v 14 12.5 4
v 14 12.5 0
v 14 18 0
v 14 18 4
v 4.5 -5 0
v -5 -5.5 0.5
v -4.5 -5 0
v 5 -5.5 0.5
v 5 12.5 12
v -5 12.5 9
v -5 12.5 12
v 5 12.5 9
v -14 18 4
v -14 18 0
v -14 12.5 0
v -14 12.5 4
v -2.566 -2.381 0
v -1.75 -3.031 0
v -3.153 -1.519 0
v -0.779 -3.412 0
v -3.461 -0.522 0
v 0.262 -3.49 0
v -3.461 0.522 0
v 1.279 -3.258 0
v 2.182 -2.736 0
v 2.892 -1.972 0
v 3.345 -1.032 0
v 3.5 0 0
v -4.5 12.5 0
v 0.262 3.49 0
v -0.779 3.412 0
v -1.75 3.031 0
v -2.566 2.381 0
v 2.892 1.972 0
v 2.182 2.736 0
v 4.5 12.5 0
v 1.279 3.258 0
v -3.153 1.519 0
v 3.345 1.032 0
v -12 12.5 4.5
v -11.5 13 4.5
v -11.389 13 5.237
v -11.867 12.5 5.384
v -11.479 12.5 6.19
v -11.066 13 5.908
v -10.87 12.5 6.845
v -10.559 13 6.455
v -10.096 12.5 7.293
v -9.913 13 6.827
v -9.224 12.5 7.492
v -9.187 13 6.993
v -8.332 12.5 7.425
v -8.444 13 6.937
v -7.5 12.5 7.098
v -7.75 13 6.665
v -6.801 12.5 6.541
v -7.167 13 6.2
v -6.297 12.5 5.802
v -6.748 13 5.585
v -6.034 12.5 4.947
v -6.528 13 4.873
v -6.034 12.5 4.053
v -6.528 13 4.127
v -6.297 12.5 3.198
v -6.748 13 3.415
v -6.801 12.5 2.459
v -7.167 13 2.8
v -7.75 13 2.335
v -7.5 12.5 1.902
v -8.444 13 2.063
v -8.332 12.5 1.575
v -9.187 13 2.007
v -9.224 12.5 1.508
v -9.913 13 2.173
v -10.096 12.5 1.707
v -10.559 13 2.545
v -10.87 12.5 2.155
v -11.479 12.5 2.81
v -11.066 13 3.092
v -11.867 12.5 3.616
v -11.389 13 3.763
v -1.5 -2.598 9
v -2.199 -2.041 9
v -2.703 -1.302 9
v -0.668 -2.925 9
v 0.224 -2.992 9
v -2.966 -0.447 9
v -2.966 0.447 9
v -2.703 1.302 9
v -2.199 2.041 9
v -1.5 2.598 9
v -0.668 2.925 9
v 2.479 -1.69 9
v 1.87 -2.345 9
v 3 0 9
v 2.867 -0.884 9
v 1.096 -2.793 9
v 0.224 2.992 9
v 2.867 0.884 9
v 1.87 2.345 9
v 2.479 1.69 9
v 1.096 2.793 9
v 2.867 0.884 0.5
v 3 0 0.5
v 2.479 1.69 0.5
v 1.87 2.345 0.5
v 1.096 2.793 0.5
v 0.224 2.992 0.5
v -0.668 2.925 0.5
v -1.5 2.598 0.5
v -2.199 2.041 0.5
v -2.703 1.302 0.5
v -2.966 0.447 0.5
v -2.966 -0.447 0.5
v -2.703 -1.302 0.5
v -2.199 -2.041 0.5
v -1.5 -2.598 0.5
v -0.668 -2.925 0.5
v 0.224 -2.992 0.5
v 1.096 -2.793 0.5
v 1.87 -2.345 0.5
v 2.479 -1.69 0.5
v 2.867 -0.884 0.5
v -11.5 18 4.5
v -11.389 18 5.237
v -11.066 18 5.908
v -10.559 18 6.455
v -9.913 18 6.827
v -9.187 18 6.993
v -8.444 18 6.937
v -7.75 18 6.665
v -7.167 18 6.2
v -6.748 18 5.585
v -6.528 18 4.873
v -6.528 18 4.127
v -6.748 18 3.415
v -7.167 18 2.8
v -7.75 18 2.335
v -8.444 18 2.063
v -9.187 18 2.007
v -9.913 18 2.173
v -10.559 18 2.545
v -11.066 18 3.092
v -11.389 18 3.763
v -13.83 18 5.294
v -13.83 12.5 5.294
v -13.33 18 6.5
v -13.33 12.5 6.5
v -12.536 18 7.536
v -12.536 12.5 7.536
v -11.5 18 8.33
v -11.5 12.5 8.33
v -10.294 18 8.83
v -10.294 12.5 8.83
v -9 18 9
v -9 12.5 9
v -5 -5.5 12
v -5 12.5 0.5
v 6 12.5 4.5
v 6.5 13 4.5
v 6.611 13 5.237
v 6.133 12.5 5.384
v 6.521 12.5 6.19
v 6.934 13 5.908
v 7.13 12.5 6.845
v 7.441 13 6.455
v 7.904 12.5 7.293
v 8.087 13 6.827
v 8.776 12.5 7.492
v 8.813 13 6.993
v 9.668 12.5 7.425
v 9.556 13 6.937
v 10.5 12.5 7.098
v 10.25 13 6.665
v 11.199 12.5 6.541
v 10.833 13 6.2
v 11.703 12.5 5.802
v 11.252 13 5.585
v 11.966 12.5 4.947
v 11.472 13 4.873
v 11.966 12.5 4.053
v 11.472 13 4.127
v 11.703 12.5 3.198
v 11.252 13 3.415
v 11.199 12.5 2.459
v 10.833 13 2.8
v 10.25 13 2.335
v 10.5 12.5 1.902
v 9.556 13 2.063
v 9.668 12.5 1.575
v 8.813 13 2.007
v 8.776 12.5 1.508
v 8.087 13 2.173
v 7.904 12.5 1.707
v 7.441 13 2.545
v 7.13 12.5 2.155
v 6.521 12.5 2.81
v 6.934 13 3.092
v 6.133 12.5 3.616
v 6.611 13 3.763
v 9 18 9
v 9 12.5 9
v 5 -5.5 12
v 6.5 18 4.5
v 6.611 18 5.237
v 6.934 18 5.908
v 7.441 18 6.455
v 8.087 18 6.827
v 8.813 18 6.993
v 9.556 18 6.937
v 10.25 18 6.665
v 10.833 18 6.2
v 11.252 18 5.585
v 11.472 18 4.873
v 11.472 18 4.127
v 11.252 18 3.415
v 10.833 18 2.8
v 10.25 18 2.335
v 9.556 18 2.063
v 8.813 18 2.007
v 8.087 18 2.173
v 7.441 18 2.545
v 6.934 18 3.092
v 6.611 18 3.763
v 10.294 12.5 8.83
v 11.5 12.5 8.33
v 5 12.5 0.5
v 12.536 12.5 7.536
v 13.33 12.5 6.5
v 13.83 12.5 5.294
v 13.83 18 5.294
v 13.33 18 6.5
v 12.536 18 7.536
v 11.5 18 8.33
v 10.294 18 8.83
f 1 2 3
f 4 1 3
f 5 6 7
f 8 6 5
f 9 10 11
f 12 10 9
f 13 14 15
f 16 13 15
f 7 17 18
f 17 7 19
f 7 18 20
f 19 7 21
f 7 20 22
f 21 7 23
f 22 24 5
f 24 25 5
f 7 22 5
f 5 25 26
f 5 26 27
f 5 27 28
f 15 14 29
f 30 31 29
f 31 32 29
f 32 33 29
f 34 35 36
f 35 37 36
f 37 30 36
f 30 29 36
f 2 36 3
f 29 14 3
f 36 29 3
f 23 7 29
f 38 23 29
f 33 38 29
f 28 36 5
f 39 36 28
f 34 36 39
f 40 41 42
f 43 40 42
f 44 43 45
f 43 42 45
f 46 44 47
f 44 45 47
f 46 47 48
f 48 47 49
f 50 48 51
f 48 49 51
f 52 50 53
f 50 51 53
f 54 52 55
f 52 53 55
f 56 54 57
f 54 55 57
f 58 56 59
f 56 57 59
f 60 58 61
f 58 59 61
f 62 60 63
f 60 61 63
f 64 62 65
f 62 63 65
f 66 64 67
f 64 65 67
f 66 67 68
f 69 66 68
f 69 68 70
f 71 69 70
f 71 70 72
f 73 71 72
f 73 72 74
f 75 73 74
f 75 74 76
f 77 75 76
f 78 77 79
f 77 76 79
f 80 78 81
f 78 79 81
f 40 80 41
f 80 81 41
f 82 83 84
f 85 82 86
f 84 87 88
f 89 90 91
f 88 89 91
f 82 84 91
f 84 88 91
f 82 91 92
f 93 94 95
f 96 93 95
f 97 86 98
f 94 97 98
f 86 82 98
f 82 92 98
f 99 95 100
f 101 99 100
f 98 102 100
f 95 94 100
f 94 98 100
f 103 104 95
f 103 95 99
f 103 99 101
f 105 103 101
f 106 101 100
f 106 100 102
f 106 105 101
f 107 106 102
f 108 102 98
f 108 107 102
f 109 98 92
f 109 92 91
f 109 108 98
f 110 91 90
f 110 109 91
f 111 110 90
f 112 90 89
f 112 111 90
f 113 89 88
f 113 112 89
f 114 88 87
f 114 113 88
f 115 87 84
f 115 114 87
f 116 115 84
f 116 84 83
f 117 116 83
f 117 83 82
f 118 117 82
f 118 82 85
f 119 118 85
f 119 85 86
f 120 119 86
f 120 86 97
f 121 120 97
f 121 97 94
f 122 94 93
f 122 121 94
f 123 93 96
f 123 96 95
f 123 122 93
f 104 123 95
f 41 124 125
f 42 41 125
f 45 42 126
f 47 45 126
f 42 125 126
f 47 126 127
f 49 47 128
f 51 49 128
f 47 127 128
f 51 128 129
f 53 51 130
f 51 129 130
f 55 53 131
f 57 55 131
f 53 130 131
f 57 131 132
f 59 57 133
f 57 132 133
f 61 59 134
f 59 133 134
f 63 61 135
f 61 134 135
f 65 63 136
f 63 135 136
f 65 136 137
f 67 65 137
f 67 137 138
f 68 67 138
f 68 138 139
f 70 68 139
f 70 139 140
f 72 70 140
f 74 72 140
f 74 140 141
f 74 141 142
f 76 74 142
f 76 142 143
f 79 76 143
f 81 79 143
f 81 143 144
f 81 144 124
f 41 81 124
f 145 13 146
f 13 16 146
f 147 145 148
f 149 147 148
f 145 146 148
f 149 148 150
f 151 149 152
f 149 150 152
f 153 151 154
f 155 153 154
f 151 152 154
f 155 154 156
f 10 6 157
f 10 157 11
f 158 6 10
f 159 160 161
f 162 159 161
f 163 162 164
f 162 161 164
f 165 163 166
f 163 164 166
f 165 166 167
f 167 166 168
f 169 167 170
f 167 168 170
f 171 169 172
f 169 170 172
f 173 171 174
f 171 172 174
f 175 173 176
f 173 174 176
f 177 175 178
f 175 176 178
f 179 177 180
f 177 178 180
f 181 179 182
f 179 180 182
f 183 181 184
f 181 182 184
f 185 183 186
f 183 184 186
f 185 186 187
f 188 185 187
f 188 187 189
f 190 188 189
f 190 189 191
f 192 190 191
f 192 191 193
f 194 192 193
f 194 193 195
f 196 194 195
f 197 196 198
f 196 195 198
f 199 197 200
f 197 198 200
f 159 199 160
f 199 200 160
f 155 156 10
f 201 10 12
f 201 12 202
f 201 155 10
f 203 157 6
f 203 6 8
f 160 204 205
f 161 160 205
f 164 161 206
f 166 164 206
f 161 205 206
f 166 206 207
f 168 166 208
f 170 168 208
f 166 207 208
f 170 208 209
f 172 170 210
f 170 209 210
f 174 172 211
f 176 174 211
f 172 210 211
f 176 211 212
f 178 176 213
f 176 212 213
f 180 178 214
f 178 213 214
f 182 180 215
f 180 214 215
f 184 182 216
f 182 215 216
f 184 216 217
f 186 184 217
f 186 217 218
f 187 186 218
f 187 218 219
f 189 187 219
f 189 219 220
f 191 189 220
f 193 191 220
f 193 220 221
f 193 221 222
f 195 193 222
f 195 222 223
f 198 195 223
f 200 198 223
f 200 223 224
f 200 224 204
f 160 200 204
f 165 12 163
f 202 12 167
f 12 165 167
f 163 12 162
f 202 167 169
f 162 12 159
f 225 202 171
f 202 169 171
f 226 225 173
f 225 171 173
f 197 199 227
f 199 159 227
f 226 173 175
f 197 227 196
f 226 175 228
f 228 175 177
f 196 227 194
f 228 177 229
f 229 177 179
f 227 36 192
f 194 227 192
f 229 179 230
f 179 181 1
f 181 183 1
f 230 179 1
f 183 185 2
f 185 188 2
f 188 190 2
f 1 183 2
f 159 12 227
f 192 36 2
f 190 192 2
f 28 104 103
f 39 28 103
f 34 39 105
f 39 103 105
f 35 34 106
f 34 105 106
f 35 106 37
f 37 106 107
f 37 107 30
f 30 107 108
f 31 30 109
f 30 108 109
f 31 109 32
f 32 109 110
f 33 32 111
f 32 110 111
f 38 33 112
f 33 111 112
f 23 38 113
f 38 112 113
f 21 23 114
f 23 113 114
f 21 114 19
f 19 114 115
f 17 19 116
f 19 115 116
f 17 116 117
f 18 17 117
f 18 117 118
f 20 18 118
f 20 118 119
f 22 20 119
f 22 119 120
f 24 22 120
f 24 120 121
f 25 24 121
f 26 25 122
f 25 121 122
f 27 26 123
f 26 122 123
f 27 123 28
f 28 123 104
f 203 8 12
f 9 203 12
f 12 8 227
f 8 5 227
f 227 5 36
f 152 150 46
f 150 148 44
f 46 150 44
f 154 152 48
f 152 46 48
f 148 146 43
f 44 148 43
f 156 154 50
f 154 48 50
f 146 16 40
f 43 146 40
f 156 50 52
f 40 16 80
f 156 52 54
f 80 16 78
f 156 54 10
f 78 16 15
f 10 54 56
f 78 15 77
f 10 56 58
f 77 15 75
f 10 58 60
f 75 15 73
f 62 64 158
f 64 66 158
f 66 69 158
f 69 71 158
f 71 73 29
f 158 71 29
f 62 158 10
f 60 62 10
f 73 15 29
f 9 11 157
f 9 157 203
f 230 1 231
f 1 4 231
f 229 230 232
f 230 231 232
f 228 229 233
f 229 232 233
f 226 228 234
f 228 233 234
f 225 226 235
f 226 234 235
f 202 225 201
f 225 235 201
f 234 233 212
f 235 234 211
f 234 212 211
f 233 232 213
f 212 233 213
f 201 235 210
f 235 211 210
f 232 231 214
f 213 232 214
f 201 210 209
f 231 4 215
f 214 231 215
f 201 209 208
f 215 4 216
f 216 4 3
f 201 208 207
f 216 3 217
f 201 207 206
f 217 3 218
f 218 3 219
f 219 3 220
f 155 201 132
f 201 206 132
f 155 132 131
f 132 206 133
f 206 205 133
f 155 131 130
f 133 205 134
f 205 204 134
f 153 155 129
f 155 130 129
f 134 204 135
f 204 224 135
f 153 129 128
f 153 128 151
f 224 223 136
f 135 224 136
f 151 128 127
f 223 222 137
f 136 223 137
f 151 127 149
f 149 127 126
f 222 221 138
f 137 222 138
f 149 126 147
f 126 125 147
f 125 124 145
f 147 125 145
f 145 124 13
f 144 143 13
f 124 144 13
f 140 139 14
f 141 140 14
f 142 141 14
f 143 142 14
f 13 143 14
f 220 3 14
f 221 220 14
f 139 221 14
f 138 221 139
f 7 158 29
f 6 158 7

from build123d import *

# Parameters (mm, degrees)
F0_R     = 3
F1_DEPTH = 9
F3_D     = 5
F4_W     = 10
F4_H     = 18
F5_DEPTH = 3
F6_R     = 5
F7_SIZE  = 0.5


with BuildPart() as f1:
    # F0 (on Top) → F1 (new body)
    with BuildSketch(Plane.XY):
        Polygon((-5, -5.5), (5, -5.5), (5, 12.5), (14, 12.5), (14, 18), (-14, 18), (-14, 12.5), (-5, 12.5), align=None)
        Circle(F0_R, mode=Mode.SUBTRACT)
    extrude(amount=F1_DEPTH)

    # F3 (through all)
    with Locations(Plane.XZ.offset(-12.5)):
        with Locations((9, 4.5), (-9, 4.5)):
            Hole(F3_D / 2)

    # F4 (on face) → F5 (join)
    with BuildSketch(Plane.XY.offset(9)):
        with Locations((0, 3.5)):
            Rectangle(F4_W, F4_H)
    extrude(amount=F5_DEPTH)

    # F6
    f6_edges = [f1.edges().sort_by_distance(p)[0] for p in [
        (14, 15.25, 9),
        (-14, 15.25, 9),
    ]]
    fillet(f6_edges, radius=F6_R)

    # F7
    f7_edges = [f1.edges().sort_by_distance(p)[0] for p in [
        (-3, 0, 0),
        (5, 3.5, 0),
        (-5, 3.5, 0),
        (0, -5.5, 0),
        (-11.5, 12.5, 4.5),
        (6.5, 12.5, 4.5),
    ]]
    chamfer(f7_edges, length=F7_SIZE)


solid = f1.part
